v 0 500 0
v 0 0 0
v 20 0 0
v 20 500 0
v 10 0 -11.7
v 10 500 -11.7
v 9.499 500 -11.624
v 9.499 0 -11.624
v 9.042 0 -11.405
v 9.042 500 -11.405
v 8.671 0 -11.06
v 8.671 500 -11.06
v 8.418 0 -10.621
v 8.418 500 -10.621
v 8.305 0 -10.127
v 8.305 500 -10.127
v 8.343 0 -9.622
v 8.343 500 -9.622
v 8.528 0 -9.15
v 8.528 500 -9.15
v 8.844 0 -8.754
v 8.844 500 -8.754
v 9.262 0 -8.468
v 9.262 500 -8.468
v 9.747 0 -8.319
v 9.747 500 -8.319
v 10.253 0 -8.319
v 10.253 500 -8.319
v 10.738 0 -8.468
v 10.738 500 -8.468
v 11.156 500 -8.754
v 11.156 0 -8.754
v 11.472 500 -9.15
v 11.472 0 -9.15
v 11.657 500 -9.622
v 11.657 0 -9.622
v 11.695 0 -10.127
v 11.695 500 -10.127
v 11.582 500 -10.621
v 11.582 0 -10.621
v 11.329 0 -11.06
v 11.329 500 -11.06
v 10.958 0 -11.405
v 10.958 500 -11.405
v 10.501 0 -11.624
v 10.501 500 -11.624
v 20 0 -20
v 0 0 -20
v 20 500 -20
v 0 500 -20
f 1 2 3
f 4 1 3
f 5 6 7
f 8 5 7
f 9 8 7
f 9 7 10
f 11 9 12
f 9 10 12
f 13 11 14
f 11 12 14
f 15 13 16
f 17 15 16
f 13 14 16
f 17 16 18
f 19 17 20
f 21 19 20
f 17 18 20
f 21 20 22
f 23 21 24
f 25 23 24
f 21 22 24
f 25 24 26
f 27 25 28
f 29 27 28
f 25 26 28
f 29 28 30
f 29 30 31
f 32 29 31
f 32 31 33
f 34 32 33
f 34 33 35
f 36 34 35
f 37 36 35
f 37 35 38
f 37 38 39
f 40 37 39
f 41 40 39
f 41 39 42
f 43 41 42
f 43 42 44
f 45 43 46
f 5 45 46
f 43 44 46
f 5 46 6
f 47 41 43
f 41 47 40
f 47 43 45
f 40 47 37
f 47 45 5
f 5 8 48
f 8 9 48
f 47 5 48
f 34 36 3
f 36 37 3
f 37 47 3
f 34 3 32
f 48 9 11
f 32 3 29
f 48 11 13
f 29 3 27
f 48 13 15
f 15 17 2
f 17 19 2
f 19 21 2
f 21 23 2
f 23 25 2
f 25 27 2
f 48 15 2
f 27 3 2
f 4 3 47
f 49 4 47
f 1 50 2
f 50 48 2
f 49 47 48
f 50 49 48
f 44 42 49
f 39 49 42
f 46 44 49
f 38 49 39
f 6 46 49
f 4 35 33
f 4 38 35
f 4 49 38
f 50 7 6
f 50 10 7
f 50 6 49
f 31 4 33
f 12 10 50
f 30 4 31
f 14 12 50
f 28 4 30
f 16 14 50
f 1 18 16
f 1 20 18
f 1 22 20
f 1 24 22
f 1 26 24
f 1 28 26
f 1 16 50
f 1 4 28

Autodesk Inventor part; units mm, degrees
ref_plane "YZ Plane" through (0, 0, 0) normal (1, 0, 0) x (0, 1, 0)
ref_plane "XZ Plane" through (0, 0, 0) normal (0, 1, 0) x (-1, 0, 0)
ref_plane "XY Plane" through (0, 0, 0) normal (0, 0, 1) x (1, 0, 0)
sketch "Sketch1" plane through (0, 0, 0) normal (0, 1, 0) x (-1, 0, 0)
  line L0 (0, 0) -> (-20, 0)
  line L1 (-20, 0) -> (-20, -20)
  line L2 (-20, -20) -> (0, -20)
  line L3 (0, -20) -> (0, 0)
  dimension "d0" = 20
  dimension "d1" = 20
extrude "Extrusion1" add sketch "Sketch1" along normal blind 500
sketch "Sketch2" plane through (0, 0, 0) normal (0, -1, 0) x (1, 0, 0)
  line L0 (0, 0) -> (20, 0) projected
  line L1 (20, 0) -> (20, -20) projected
  point P0 (10, -10)
  point P1 (10, 0)
  point P2 (20, -10)
hole "Hole1" at (10, 0, -10) direction (0, 1, 0) diameter 3.4 end through all clearance for "Countersunk Flat Head Screw DIN EN ISO 2009" size "M3" standard "DIN"
equation "\"d0\" = extrusion_dim"
equation "\"d1\" = extrusion_dim"
equation "\"d2\" = tower_height"
equation "\"base_thickness\" = 12.7"
equation "\"tower_height\" = 500"
equation "\"extrusion_dim\" = 20"
equation "\"top_sheet_thickness\" = 6.35"
properties part number "Tower" material "Aluminum 6061"
